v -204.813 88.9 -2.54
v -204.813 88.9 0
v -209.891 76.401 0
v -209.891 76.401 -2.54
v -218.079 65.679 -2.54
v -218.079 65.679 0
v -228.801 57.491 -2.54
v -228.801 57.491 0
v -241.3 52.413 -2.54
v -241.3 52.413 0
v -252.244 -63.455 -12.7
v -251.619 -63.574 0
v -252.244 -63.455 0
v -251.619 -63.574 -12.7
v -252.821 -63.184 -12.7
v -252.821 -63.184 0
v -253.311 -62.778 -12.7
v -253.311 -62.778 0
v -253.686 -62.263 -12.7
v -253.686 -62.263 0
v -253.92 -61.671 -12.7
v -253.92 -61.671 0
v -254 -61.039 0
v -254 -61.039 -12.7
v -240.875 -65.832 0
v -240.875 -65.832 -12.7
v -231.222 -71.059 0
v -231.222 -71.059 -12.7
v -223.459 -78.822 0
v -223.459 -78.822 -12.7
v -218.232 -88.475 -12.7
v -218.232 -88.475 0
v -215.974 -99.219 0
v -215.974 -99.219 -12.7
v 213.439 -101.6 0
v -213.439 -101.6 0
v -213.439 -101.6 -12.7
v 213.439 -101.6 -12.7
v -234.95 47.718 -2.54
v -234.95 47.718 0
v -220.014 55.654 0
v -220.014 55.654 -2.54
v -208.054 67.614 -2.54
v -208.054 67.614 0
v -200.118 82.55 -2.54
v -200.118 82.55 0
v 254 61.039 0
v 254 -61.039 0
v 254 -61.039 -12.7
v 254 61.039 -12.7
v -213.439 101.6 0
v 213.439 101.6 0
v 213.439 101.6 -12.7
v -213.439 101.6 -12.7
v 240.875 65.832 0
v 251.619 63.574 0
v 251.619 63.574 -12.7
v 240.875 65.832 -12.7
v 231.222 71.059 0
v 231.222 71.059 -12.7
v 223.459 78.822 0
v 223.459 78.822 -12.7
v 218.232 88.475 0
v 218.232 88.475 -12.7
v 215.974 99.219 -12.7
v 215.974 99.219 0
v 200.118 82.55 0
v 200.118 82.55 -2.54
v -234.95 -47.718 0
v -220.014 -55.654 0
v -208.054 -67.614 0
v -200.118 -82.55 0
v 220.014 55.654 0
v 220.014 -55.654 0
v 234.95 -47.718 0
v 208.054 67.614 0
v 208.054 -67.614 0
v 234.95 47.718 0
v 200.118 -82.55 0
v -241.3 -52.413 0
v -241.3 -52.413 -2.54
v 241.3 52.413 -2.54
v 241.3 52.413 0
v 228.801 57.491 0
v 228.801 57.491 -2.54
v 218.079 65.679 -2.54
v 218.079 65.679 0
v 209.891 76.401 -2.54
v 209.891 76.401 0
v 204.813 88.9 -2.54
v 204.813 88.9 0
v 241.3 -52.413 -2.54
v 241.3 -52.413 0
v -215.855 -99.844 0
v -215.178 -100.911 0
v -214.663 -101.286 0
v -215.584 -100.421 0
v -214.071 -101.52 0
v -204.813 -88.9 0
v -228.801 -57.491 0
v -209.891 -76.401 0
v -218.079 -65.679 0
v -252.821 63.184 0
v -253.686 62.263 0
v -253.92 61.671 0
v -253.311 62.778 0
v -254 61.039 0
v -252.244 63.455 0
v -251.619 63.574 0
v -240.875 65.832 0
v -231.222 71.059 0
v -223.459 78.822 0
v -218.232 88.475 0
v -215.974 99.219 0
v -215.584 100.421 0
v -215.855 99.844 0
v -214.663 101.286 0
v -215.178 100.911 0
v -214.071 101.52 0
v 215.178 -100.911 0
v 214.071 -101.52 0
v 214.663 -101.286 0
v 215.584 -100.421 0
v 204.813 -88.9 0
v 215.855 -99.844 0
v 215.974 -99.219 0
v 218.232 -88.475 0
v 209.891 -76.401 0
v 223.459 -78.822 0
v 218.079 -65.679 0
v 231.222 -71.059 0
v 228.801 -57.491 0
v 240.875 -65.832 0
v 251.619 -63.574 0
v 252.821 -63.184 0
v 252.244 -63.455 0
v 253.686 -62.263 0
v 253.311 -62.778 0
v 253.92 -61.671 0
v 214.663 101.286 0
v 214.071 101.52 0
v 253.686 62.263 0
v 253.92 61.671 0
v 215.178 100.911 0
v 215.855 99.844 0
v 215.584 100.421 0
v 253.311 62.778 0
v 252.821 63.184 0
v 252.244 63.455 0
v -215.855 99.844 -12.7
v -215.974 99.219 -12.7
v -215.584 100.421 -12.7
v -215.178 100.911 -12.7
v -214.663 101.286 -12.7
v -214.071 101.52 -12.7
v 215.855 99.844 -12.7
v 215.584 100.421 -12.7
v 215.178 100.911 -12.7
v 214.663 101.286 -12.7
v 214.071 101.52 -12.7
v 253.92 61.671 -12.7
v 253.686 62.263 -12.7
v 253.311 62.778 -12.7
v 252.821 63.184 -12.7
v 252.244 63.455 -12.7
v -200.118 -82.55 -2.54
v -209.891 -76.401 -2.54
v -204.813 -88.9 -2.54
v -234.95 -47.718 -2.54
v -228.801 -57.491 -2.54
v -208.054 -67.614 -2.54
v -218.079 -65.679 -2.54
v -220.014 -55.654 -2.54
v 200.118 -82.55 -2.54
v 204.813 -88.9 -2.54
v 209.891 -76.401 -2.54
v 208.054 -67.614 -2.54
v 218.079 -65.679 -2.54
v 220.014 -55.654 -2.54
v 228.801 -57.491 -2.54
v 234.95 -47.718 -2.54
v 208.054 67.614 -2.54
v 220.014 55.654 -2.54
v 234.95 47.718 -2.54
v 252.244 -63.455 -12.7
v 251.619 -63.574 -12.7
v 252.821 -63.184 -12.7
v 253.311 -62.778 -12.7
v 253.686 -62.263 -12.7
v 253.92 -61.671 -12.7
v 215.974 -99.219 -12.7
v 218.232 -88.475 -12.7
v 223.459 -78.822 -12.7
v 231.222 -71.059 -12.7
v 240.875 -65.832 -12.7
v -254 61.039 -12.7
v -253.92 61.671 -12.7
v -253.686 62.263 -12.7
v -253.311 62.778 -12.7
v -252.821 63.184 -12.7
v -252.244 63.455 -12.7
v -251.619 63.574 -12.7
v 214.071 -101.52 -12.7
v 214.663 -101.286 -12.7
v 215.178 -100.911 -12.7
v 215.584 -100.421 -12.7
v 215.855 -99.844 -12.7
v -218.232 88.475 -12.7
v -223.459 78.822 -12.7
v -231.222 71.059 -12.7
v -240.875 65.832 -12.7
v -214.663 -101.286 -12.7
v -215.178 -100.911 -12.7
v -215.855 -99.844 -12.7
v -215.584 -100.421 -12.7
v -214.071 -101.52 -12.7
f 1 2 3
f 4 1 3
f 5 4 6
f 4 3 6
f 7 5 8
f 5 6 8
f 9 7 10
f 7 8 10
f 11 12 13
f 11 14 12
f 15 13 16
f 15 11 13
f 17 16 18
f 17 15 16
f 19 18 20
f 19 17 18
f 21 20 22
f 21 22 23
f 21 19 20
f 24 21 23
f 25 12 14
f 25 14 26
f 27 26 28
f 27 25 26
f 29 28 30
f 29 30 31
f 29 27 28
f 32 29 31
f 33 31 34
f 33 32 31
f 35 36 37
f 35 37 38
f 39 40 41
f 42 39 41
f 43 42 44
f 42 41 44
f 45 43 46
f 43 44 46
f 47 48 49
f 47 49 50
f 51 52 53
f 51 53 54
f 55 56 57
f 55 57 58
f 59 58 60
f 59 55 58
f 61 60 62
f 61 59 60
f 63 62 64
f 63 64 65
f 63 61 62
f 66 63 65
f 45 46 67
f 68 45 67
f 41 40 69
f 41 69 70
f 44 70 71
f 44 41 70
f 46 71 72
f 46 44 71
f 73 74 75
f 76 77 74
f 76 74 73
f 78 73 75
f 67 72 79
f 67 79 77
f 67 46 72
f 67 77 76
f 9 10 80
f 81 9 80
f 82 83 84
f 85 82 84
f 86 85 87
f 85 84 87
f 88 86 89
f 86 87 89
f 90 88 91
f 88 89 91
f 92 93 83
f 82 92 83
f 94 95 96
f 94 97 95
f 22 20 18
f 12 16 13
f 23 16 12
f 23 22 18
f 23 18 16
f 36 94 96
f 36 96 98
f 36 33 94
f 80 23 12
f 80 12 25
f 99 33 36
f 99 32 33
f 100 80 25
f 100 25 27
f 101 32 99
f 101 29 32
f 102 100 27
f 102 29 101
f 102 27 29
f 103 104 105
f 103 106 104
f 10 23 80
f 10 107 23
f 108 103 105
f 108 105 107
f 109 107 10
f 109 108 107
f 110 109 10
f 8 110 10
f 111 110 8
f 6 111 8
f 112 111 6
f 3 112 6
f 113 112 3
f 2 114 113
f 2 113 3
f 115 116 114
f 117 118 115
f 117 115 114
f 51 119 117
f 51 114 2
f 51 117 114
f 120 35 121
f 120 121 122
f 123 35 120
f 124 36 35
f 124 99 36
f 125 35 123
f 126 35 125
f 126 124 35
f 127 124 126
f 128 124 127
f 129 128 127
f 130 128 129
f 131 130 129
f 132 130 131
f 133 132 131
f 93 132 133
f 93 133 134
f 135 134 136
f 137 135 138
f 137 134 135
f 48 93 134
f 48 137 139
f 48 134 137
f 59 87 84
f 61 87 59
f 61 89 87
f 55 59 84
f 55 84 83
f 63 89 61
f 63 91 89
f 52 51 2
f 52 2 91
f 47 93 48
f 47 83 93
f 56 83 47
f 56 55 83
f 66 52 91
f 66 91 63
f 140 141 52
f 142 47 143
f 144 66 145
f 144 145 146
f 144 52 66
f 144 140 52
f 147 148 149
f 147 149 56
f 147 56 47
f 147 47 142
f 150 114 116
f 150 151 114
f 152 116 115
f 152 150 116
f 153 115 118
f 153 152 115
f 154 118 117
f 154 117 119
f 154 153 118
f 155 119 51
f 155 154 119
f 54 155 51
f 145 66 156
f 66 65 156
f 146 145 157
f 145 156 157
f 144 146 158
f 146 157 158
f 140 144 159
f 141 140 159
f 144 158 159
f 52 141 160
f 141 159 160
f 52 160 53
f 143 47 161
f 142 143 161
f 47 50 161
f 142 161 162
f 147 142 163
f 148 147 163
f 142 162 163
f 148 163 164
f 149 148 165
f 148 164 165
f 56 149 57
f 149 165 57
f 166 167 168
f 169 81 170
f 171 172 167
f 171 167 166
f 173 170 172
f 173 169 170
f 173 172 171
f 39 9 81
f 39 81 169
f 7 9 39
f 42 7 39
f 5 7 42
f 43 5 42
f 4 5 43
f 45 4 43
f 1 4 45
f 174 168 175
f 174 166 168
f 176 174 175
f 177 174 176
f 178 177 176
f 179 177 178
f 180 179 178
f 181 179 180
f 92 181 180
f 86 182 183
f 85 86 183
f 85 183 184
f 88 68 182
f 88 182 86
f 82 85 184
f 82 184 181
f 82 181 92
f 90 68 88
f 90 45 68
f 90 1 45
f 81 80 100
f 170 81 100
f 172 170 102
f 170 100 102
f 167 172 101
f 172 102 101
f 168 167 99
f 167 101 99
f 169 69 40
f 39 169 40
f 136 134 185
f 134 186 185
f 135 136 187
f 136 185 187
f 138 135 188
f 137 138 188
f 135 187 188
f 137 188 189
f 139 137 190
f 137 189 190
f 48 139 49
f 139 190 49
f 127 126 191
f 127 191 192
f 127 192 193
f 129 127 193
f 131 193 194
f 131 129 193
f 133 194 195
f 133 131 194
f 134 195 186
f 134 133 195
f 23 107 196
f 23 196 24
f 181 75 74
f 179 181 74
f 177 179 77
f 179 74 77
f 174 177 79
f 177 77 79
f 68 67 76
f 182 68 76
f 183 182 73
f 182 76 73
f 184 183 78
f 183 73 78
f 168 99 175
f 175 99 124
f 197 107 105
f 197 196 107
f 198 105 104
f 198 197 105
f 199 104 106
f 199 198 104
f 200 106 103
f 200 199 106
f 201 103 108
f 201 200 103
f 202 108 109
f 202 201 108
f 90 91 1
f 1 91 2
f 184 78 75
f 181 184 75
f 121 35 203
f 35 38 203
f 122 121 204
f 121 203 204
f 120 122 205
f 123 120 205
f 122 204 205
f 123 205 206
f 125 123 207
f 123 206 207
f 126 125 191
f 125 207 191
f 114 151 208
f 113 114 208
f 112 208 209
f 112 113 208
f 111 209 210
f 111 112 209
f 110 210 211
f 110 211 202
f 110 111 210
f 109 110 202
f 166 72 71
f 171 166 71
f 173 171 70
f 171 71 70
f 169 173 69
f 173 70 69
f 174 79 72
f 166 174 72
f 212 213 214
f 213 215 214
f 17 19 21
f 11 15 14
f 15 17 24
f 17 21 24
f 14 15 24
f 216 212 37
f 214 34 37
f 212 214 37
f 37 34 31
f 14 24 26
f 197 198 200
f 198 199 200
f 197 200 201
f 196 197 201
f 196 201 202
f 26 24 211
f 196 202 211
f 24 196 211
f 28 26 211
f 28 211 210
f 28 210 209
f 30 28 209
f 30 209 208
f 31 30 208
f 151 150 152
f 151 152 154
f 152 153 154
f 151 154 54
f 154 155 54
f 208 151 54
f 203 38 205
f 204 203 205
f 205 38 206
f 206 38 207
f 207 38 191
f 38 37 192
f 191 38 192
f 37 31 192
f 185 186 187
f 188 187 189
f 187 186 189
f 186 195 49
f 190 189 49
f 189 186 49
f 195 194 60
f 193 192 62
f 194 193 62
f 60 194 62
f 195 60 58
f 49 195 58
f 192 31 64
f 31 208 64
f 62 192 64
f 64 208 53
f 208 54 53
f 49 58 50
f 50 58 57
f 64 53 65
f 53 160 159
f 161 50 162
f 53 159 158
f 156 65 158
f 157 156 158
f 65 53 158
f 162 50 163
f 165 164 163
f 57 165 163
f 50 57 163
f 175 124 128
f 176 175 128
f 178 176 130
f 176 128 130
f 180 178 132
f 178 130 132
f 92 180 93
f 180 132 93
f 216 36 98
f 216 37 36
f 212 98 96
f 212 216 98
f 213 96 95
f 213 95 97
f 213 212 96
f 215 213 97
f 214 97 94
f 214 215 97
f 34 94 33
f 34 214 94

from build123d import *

# Parameters (mm, degrees)
F1_DEPTH = 12.7
F3_DEPTH = 2.54
F4_R     = 2.54


with BuildPart() as f1:
    # F0 (on Top) → F1 (new body)
    with BuildSketch(Plane.XY):
        with BuildLine():
            Line((-215.9, -101.6), (215.9, -101.6))
            ThreePointArc((215.9, -101.6), (227.059232, -74.659232), (254, -63.5))
            Line((254, -63.5), (254, 63.5))
            ThreePointArc((254, 63.5), (227.059232, 74.659232), (215.9, 101.6))
            Line((215.9, 101.6), (-215.9, 101.6))
            ThreePointArc((-215.9, 101.6), (-227.059232, 74.659232), (-254, 63.5))
            Line((-254, 63.5), (-254, -63.5))
            ThreePointArc((-254, -63.5), (-227.059232, -74.659232), (-215.9, -101.6))
        make_face()
    extrude(amount=-F1_DEPTH)

    # F2 (on face) → F3 (cut)
    with BuildSketch(Plane.XY):
        with BuildLine():
            ThreePointArc((241.3, 52.413112), (218.078976, 65.678976), (204.813112, 88.9))
            Line((204.813112, 88.9), (-204.813112, 88.9))
            ThreePointArc((-204.813112, 88.9), (-218.078976, 65.678976), (-241.3, 52.413112))
            Line((-241.3, 52.413112), (-241.3, -52.413112))
            ThreePointArc((-241.3, -52.413112), (-218.078976, -65.678976), (-204.813112, -88.9))
            Line((-204.813112, -88.9), (204.813112, -88.9))
            ThreePointArc((204.813112, -88.9), (218.078976, -65.678976), (241.3, -52.413112))
            Line((241.3, -52.413112), (241.3, 52.413112))
        make_face()
        with BuildLine():
            Line((-200.118461, 82.549997), (200.118461, 82.549997))
            ThreePointArc((200.118461, 82.549997), (213.588845, 61.188845), (234.949997, 47.718461))
            Line((234.949997, 47.718461), (234.949997, -47.718461))
            ThreePointArc((234.949997, -47.718461), (213.588845, -61.188845), (200.118461, -82.549997))
            Line((200.118461, -82.549997), (-200.118461, -82.549997))
            ThreePointArc((-200.118461, -82.549997), (-213.588845, -61.188845), (-234.949997, -47.718461))
            Line((-234.949997, -47.718461), (-234.949997, 47.718461))
            ThreePointArc((-234.949997, 47.718461), (-213.588845, 61.188845), (-200.118461, 82.549997))
        make_face(mode=Mode.SUBTRACT)
    extrude(amount=-F3_DEPTH, mode=Mode.SUBTRACT)

    # F4
    f4_edges = [f1.edges().sort_by_distance(p)[0] for p in [
        (-254, 63.5, -6.35),
        (-215.9, 101.6, -6.35),
        (254, 63.5, -6.35),
        (215.9, 101.6, -6.35),
        (254, -63.5, -6.35),
        (215.9, -101.6, -6.35),
        (-215.9, -101.6, -6.35),
        (-254, -63.5, -6.35),
    ]]
    fillet(f4_edges, radius=F4_R)


solid = f1.part
